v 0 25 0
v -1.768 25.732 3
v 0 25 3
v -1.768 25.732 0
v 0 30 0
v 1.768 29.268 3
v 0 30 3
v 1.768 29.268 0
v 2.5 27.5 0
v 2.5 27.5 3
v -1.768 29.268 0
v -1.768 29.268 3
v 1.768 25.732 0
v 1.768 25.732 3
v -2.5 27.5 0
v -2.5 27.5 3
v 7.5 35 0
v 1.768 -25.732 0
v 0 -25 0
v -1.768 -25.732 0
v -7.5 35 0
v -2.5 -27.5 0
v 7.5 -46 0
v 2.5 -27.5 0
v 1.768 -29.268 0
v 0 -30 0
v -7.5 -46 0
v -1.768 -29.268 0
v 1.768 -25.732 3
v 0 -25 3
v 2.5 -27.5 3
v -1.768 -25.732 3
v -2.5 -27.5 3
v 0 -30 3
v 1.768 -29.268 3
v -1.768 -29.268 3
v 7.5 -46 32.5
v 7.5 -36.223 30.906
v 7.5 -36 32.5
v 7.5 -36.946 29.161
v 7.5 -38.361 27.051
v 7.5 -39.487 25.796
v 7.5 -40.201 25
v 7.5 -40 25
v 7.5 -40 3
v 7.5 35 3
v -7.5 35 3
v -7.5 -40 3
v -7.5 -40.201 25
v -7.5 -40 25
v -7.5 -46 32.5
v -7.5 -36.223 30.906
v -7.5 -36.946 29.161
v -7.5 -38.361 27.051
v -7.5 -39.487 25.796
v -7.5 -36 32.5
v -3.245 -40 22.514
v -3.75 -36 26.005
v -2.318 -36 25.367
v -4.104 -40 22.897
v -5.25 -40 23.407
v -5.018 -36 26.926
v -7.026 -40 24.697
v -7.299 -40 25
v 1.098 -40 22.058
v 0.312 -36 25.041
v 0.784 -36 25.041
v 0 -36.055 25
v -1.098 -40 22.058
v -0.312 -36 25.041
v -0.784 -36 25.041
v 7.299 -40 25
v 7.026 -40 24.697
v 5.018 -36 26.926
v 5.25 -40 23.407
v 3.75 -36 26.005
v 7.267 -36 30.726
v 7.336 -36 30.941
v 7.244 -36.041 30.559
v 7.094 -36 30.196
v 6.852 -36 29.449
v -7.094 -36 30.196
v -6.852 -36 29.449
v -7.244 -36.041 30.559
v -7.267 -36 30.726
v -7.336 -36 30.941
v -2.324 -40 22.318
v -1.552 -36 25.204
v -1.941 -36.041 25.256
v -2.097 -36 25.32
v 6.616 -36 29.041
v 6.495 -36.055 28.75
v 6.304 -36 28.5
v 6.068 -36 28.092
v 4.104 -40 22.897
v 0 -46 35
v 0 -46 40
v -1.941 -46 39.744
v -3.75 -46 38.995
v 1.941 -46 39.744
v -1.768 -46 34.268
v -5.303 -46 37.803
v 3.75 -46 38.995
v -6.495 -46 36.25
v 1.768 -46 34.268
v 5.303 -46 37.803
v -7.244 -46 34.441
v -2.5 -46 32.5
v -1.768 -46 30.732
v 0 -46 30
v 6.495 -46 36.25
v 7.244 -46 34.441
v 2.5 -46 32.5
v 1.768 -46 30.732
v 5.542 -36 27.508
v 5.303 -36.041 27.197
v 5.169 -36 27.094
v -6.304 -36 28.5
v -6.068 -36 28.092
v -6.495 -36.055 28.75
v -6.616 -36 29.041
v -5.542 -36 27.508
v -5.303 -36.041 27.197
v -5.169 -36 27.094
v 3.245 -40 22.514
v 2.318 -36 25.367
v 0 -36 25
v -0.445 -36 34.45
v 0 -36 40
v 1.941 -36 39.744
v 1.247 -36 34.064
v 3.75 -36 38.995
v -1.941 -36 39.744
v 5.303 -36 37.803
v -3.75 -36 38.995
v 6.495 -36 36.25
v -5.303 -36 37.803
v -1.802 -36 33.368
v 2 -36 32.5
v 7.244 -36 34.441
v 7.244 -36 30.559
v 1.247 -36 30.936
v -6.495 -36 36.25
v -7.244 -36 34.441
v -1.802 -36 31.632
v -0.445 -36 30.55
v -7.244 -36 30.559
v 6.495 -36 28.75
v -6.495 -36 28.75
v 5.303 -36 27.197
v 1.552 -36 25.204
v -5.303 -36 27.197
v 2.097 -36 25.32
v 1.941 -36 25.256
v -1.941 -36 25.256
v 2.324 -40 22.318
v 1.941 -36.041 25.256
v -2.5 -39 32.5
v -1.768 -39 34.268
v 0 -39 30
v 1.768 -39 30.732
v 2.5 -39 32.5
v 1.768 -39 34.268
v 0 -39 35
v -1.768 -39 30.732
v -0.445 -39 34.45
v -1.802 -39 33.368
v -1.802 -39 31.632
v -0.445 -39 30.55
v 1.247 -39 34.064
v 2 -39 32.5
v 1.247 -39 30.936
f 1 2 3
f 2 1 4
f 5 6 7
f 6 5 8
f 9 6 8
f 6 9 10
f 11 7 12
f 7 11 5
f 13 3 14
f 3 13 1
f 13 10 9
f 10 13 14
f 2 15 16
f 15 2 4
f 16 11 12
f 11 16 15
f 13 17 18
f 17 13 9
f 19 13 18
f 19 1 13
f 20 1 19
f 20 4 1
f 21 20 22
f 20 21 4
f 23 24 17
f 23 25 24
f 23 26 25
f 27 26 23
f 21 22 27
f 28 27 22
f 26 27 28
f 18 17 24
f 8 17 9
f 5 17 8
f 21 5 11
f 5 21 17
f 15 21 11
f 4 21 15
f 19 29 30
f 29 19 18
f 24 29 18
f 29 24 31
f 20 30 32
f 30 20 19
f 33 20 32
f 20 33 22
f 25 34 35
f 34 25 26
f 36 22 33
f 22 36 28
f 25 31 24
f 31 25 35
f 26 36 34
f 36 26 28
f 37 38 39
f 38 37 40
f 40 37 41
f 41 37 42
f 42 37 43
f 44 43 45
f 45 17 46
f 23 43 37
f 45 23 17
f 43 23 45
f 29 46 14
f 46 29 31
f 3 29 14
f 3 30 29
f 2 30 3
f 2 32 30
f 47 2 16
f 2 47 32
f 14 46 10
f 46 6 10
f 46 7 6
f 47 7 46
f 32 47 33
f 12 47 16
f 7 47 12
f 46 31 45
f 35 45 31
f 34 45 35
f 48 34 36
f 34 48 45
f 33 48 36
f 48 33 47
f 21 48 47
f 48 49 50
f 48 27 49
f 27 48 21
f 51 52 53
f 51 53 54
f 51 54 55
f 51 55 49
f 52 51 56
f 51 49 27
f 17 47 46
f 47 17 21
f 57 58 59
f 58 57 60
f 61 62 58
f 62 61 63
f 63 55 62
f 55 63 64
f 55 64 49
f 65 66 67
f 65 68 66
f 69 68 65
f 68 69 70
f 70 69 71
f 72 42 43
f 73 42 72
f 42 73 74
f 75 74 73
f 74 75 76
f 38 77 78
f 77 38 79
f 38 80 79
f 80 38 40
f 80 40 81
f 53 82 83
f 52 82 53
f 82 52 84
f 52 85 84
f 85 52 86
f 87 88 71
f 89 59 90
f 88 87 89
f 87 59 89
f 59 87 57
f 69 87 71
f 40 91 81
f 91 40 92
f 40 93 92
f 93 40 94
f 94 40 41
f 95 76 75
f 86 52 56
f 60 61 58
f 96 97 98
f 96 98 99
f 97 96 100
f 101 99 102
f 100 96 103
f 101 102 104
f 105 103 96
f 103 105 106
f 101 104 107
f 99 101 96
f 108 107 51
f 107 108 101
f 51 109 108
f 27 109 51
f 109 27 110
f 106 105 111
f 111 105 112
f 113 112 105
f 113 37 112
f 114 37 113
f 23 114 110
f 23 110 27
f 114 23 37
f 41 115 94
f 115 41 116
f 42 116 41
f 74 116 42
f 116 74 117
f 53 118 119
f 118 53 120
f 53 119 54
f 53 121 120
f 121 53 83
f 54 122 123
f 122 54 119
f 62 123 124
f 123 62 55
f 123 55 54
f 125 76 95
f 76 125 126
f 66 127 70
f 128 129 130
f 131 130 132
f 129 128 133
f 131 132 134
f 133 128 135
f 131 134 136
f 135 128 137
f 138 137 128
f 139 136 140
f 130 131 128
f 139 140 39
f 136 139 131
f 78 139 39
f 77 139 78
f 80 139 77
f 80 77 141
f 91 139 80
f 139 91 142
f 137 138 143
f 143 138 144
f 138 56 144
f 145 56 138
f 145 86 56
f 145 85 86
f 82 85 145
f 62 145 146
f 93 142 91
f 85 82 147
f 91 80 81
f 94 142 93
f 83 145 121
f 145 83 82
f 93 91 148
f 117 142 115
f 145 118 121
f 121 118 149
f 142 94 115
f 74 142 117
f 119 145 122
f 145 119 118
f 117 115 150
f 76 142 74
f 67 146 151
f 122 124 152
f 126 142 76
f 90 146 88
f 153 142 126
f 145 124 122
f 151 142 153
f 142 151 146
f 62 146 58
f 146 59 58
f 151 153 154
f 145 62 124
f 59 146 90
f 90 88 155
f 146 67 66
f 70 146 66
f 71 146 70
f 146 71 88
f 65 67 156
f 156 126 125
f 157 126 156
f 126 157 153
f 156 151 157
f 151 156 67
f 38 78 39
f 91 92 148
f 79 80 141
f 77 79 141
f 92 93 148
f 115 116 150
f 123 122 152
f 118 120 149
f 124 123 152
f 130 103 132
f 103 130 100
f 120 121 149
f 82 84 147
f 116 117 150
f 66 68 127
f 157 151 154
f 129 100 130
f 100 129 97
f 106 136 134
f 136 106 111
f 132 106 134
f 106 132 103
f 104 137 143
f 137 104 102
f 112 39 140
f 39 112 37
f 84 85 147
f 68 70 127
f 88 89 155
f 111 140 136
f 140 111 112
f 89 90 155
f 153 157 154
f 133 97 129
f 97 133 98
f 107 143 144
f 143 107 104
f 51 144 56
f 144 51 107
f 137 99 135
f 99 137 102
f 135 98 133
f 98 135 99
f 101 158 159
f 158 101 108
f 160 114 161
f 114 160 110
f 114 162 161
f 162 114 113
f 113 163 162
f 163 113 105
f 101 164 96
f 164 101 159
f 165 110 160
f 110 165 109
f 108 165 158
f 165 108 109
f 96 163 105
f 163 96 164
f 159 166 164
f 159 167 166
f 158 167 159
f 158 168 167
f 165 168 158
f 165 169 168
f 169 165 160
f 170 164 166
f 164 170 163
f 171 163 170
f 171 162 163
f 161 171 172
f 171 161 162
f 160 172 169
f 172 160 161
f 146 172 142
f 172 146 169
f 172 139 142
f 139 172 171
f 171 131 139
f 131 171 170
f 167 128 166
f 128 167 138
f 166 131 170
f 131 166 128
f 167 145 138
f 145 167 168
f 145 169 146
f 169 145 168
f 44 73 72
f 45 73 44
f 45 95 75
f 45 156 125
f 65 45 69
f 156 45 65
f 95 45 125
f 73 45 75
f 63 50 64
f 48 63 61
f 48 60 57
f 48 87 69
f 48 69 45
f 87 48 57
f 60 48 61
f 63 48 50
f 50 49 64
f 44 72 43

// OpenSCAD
// create a spacer for the new brass extruder assembly

// 15x70x3
length = 70;
hole_space=55;
hole_size=5;

feedBottomLength = 5;

feedVerticalHeight = 25;
feedVerticalLength = 6;
verticalYpos = -1*(feedBottomLength+feedVerticalLength+length/2);

// bottom section with holes
difference() {
    translate([-7.5,-1*(length/2),0])cube([15,length,3]);

    union() {
        translate([0, 1*(length/2-((length-hole_space)/2)),0])cylinder(d=hole_size,h=4,center=false);
        translate([0,-1*(length/2-((length-hole_space)/2)),0])cylinder(d=hole_size,h=4,center=false);
    }
}

// extra spacer
translate([-7.5,-1*(feedBottomLength+length/2),0])
cube([15,feedBottomLength,3]);

// vertical bar of feeder
translate([-7.5,verticalYpos,0])
cube([15,feedVerticalLength,feedVerticalHeight]);

// rounded part with hole
translate([0,verticalYpos,feedVerticalHeight])
translate([0,0,15/2])
rotate([-90,0,0])
difference() {
    union() {
        cylinder(r=15/2,h=feedVerticalLength+4);
        //translate([-7.5,0,0])
        //cube([15,15/2,feedVerticalLength]);

        intersection() {
            cylinder(r2=15/2,r1=30/2,h=feedVerticalLength+4);
            translate([-7.5,0,0])
            cube([15,15,feedVerticalLength+4]);
        }
    }
    union() {
        cylinder(r=5/2,h=feedVerticalLength+4-3);
        cylinder(r=2,h=feedVerticalLength+4);
    }
}
